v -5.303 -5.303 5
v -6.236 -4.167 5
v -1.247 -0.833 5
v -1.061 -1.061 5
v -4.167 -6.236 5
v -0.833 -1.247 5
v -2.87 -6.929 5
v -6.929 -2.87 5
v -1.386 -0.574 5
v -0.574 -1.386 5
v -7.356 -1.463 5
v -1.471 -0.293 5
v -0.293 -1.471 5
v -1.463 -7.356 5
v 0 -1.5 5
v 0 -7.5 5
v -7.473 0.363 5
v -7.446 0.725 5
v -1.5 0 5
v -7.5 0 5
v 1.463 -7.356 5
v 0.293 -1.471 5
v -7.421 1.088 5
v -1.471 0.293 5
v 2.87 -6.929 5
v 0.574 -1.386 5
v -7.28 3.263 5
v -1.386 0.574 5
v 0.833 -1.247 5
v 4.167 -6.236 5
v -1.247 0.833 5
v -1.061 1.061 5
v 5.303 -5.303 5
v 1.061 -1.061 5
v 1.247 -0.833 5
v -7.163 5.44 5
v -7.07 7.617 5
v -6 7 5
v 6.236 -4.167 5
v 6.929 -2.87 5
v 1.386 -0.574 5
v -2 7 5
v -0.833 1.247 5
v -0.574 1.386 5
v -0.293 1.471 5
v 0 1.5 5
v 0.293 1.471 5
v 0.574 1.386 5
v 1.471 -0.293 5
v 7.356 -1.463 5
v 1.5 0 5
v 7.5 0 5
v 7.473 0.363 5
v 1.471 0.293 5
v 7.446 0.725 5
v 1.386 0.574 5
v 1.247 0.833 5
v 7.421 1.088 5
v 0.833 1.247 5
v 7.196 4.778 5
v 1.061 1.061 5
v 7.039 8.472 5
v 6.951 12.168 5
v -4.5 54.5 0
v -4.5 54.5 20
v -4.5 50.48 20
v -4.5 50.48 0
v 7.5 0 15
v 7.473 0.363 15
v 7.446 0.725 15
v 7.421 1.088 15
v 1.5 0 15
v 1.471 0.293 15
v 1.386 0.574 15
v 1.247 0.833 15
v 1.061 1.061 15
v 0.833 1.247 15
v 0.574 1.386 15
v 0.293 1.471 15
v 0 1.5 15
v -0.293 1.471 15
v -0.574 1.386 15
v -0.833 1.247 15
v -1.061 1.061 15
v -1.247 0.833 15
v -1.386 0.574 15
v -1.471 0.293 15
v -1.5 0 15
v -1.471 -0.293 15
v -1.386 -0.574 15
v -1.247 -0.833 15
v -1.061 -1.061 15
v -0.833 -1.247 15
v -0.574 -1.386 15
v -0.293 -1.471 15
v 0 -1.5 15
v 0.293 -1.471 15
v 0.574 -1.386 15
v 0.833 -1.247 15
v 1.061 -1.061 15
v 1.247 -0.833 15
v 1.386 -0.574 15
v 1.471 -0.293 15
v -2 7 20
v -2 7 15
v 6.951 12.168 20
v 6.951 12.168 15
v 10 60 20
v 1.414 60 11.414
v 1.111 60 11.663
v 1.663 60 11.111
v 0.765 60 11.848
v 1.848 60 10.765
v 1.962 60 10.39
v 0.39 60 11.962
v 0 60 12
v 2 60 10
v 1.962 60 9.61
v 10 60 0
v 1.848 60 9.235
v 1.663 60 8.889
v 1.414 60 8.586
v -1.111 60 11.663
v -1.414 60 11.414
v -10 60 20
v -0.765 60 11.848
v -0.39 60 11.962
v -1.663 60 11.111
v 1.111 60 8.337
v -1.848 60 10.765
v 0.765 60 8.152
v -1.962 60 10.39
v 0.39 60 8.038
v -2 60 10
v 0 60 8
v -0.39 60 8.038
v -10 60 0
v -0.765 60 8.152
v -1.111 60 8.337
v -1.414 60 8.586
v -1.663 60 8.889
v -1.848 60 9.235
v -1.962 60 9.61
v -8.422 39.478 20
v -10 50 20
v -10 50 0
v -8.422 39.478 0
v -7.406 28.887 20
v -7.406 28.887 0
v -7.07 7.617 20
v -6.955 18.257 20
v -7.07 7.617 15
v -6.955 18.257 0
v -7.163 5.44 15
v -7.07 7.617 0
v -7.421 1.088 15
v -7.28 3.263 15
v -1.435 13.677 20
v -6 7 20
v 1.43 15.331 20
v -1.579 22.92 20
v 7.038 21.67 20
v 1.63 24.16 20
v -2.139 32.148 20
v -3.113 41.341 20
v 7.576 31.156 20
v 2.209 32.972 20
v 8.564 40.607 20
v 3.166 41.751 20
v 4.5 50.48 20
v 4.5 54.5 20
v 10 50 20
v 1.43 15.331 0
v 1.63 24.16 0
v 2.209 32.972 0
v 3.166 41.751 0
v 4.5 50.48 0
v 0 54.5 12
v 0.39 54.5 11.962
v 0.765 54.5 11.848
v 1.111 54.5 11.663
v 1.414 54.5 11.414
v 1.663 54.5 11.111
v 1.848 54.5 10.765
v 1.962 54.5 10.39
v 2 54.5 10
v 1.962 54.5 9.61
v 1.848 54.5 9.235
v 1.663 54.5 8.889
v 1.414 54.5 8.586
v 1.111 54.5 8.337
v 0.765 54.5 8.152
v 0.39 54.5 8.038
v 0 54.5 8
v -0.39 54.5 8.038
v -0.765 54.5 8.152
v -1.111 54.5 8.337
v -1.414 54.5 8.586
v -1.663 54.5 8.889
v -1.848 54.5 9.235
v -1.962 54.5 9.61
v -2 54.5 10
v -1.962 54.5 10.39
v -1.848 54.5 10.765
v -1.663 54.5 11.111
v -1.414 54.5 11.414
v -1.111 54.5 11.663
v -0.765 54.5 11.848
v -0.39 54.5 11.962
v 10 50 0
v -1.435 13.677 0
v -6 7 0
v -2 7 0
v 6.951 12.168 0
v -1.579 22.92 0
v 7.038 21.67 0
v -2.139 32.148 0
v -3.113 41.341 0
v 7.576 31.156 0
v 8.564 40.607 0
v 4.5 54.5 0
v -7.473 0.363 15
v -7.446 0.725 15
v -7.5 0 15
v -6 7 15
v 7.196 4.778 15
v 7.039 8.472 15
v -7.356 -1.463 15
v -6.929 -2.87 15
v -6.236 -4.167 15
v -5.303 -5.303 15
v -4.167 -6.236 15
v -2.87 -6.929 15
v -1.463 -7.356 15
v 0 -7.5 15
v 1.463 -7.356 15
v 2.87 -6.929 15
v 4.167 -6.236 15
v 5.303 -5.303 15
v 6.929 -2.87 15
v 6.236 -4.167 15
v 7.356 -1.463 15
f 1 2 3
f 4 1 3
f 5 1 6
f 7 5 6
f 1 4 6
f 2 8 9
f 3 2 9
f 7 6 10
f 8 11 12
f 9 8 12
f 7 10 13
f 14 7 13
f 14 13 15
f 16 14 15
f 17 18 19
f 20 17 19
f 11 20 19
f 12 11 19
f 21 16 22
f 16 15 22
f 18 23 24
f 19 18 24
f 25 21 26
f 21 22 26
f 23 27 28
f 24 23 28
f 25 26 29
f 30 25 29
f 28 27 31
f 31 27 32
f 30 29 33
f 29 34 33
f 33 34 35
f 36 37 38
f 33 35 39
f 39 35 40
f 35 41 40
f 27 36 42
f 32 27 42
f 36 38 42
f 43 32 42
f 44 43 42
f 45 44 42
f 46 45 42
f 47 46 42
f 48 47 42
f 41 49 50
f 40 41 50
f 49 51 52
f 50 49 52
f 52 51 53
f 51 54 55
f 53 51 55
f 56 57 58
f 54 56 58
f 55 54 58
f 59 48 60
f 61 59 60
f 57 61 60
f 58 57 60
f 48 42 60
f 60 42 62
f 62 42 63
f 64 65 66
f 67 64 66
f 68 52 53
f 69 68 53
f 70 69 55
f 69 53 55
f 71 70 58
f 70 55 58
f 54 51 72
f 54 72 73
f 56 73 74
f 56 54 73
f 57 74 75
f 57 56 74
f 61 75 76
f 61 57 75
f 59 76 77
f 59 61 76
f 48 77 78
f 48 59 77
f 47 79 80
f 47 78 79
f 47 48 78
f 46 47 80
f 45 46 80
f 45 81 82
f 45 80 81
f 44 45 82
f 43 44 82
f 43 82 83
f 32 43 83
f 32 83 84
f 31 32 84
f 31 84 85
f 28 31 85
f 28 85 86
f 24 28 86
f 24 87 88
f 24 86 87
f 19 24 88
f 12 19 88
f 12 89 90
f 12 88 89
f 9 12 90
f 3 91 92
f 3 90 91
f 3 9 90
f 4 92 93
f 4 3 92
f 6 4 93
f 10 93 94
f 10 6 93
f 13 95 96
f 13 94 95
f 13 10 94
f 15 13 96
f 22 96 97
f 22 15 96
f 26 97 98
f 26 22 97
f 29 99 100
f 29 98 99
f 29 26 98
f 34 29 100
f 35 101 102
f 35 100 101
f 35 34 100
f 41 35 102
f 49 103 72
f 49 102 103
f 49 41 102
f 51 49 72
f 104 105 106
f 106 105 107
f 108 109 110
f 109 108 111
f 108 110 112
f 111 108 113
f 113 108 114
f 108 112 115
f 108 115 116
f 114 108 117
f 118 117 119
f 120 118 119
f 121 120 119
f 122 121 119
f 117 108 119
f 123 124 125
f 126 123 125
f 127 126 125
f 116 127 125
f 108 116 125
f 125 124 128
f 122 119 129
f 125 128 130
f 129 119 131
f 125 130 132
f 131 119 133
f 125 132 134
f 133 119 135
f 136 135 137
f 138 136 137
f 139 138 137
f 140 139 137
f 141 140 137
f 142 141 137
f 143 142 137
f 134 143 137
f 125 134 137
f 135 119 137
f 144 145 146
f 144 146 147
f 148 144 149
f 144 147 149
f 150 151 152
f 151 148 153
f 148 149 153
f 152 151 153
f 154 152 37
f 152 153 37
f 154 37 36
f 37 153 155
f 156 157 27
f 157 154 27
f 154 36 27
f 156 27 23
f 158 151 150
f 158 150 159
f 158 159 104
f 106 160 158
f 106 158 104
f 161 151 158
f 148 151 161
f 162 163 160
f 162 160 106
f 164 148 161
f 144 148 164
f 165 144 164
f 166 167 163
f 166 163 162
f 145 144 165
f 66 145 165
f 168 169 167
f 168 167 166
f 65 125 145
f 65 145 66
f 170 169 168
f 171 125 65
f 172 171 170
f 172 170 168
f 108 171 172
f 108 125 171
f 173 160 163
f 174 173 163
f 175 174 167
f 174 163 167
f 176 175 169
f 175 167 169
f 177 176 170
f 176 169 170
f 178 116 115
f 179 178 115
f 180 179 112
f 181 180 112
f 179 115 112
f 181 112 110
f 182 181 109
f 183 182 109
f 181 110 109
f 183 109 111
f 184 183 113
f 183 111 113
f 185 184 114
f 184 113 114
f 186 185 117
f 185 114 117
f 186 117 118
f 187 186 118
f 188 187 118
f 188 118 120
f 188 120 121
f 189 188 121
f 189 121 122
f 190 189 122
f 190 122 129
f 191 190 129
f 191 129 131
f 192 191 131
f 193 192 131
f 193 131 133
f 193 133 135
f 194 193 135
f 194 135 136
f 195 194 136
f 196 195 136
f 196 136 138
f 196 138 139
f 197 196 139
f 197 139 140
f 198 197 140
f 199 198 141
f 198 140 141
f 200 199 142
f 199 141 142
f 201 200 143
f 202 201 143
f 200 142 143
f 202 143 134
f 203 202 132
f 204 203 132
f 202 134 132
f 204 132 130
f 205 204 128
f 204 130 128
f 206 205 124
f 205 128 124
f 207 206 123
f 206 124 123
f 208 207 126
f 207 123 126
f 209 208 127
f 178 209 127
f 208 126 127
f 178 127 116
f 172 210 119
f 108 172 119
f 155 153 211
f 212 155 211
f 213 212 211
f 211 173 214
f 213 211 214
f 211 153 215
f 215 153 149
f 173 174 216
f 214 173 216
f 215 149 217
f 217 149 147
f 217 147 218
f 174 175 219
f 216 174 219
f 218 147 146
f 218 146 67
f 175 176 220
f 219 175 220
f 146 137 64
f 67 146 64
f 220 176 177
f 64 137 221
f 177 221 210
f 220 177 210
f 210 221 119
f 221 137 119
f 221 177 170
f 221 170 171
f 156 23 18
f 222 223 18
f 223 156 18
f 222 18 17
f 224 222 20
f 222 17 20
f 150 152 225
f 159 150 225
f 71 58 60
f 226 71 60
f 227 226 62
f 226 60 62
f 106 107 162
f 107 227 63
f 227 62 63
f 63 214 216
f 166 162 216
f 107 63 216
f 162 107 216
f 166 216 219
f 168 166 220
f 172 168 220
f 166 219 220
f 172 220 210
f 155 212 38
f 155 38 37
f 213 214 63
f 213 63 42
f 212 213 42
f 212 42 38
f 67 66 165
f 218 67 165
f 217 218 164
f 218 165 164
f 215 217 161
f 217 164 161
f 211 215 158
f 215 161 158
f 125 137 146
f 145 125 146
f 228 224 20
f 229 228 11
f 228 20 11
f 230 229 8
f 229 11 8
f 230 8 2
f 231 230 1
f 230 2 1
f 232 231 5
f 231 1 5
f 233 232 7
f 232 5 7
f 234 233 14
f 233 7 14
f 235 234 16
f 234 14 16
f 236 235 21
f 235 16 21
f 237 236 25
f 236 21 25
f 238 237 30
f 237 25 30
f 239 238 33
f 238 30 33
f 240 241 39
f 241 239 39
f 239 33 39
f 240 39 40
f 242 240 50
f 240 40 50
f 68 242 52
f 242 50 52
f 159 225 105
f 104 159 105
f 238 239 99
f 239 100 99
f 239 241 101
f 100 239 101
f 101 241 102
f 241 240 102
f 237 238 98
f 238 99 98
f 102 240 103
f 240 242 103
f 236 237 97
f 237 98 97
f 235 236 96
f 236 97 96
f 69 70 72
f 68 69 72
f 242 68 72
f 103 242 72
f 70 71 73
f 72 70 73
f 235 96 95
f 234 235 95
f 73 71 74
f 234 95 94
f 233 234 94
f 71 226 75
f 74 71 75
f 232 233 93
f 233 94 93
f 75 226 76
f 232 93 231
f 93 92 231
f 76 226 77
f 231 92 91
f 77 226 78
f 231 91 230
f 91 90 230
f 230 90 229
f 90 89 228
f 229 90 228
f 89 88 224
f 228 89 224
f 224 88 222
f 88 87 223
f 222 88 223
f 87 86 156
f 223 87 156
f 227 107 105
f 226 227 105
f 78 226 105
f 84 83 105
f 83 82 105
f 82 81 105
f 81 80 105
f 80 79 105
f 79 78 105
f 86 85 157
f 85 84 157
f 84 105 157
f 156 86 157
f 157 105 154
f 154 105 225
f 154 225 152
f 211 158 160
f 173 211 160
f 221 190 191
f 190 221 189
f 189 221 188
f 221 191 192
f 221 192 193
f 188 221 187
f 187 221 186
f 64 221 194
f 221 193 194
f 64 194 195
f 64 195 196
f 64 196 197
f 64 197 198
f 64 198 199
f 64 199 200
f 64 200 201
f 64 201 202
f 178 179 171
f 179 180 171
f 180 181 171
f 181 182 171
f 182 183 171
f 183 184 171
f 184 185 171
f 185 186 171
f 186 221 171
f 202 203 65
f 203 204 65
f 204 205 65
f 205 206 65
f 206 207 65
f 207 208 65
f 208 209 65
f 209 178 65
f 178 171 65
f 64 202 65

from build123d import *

# Parameters (mm, degrees)
CROQUIS1_R              = 1.5
SALIENTE_EXTRUIR1_DEPTH = 20
CORTAR_EXTRUIR1_START   = -5
CORTAR_EXTRUIR1_DEPTH   = 5
CORTAR_EXTRUIR2_DEPTH   = 5
CORTAR_EXTRUIR3_DEPTH   = 65.031242374
CROQUIS5_R              = 2
CORTAR_EXTRUIR4_DEPTH   = 10


with BuildPart() as part:
    # Croquis1 → Saliente-Extruir1 (new body)
    # profile 1 of 2: a face of its own
    with BuildSketch(Plane.XY):
        with BuildLine():
            ThreePointArc((7.420644355, 1.088134807), (7.207357835, 25.623325873), (10, 50))
            Line((10, 50), (10, 60))
            Line((10, 60), (-10, 60))
            Line((-10, 60), (-10, 50))
            ThreePointArc((-10, 50), (-7.207357835, 25.623325873), (-7.420644355, 1.088134807))
            ThreePointArc((-7.420644355, 1.088134807), (0, 7.5), (7.420644355, 1.088134807))
        make_face()
    # profile 2 of 2: a face of its own
    with BuildSketch(Plane.XY):
        with BuildLine():
            ThreePointArc((7.5, 0), (7.459580187, 0.544013292), (7.420644355, 1.088134807))
            ThreePointArc((7.420644355, 1.088134807), (0, 7.5), (-7.420644355, 1.088134807))
            ThreePointArc((-7.420644355, 1.088134807), (-7.459580187, 0.544013292), (-7.5, 0))
            ThreePointArc((-7.5, 0), (0, -7.5), (7.5, 0))
        make_face()
        Circle(CROQUIS1_R, mode=Mode.SUBTRACT)
    extrude(amount=SALIENTE_EXTRUIR1_DEPTH)

    # Croquis2 → Cortar-Extruir1 (cut)
    with BuildSketch(Plane.XY.offset(20).offset(CORTAR_EXTRUIR1_START)):
        with BuildLine():
            Line((-7.069523462, 7.617489658), (-6, 7))
            Line((-6, 7), (-2, 7))
            Line((-2, 7), (6.951202379, 12.167979103))
            ThreePointArc((6.951202379, 12.167979103), (7.132948314, 6.079810741), (7.5, 0))
            ThreePointArc((7.5, 0), (0, -7.5), (-7.5, 0))
            ThreePointArc((-7.5, 0), (-7.24843422, 3.806691903), (-7.069523462, 7.617489658))
        make_face()
    extrude(amount=CORTAR_EXTRUIR1_DEPTH, mode=Mode.SUBTRACT)

    # Croquis3 → Cortar-Extruir2 (cut)
    with BuildSketch(Plane(origin=(0, 0, 0), x_dir=(-1, 0, 0), z_dir=(0, 0, -1))):
        with BuildLine():
            Line((-6.951202379, 12.167979103), (2, 7))
            Line((2, 7), (6, 7))
            Line((6, 7), (7.069523462, 7.617489658))
            ThreePointArc((7.069523462, 7.617489658), (7.24843422, 3.806691903), (7.5, 0))
            ThreePointArc((7.5, 0), (0, -7.5), (-7.5, 0))
            ThreePointArc((-7.5, 0), (-7.132948314, 6.079810741), (-6.951202379, 12.167979103))
        make_face()
    extrude(amount=-CORTAR_EXTRUIR2_DEPTH, mode=Mode.SUBTRACT)

    # Croquis4 → Cortar-Extruir3 (cut, through all)
    with BuildSketch(Plane.XY.offset(20)):
        with BuildLine():
            Line((-1.434704258, 13.67722661), (1.429981311, 15.331153594))
            ThreePointArc((1.429981311, 15.331153594), (2.209232224, 32.971789387), (4.5, 50.480405727))
            Line((4.5, 50.480405727), (4.5, 54.5))
            Line((4.5, 54.5), (-4.5, 54.5))
            Line((-4.5, 54.5), (-4.5, 50.480405727))
            ThreePointArc((-4.5, 50.480405727), (-2.13893455, 32.147814145), (-1.434704258, 13.67722661))
        make_face()
    extrude(amount=-CORTAR_EXTRUIR3_DEPTH, mode=Mode.SUBTRACT)

    # Croquis5 → Cortar-Extruir4 (cut)
    with BuildSketch(Plane(origin=(0, 60, 0), x_dir=(1, 0, 0), z_dir=(0, 1, 0))):
        with Locations(Location((0, -10, 0), (0, 0, 270))):
            Circle(CROQUIS5_R)
    extrude(amount=-CORTAR_EXTRUIR4_DEPTH, mode=Mode.SUBTRACT)


solid = part.part
